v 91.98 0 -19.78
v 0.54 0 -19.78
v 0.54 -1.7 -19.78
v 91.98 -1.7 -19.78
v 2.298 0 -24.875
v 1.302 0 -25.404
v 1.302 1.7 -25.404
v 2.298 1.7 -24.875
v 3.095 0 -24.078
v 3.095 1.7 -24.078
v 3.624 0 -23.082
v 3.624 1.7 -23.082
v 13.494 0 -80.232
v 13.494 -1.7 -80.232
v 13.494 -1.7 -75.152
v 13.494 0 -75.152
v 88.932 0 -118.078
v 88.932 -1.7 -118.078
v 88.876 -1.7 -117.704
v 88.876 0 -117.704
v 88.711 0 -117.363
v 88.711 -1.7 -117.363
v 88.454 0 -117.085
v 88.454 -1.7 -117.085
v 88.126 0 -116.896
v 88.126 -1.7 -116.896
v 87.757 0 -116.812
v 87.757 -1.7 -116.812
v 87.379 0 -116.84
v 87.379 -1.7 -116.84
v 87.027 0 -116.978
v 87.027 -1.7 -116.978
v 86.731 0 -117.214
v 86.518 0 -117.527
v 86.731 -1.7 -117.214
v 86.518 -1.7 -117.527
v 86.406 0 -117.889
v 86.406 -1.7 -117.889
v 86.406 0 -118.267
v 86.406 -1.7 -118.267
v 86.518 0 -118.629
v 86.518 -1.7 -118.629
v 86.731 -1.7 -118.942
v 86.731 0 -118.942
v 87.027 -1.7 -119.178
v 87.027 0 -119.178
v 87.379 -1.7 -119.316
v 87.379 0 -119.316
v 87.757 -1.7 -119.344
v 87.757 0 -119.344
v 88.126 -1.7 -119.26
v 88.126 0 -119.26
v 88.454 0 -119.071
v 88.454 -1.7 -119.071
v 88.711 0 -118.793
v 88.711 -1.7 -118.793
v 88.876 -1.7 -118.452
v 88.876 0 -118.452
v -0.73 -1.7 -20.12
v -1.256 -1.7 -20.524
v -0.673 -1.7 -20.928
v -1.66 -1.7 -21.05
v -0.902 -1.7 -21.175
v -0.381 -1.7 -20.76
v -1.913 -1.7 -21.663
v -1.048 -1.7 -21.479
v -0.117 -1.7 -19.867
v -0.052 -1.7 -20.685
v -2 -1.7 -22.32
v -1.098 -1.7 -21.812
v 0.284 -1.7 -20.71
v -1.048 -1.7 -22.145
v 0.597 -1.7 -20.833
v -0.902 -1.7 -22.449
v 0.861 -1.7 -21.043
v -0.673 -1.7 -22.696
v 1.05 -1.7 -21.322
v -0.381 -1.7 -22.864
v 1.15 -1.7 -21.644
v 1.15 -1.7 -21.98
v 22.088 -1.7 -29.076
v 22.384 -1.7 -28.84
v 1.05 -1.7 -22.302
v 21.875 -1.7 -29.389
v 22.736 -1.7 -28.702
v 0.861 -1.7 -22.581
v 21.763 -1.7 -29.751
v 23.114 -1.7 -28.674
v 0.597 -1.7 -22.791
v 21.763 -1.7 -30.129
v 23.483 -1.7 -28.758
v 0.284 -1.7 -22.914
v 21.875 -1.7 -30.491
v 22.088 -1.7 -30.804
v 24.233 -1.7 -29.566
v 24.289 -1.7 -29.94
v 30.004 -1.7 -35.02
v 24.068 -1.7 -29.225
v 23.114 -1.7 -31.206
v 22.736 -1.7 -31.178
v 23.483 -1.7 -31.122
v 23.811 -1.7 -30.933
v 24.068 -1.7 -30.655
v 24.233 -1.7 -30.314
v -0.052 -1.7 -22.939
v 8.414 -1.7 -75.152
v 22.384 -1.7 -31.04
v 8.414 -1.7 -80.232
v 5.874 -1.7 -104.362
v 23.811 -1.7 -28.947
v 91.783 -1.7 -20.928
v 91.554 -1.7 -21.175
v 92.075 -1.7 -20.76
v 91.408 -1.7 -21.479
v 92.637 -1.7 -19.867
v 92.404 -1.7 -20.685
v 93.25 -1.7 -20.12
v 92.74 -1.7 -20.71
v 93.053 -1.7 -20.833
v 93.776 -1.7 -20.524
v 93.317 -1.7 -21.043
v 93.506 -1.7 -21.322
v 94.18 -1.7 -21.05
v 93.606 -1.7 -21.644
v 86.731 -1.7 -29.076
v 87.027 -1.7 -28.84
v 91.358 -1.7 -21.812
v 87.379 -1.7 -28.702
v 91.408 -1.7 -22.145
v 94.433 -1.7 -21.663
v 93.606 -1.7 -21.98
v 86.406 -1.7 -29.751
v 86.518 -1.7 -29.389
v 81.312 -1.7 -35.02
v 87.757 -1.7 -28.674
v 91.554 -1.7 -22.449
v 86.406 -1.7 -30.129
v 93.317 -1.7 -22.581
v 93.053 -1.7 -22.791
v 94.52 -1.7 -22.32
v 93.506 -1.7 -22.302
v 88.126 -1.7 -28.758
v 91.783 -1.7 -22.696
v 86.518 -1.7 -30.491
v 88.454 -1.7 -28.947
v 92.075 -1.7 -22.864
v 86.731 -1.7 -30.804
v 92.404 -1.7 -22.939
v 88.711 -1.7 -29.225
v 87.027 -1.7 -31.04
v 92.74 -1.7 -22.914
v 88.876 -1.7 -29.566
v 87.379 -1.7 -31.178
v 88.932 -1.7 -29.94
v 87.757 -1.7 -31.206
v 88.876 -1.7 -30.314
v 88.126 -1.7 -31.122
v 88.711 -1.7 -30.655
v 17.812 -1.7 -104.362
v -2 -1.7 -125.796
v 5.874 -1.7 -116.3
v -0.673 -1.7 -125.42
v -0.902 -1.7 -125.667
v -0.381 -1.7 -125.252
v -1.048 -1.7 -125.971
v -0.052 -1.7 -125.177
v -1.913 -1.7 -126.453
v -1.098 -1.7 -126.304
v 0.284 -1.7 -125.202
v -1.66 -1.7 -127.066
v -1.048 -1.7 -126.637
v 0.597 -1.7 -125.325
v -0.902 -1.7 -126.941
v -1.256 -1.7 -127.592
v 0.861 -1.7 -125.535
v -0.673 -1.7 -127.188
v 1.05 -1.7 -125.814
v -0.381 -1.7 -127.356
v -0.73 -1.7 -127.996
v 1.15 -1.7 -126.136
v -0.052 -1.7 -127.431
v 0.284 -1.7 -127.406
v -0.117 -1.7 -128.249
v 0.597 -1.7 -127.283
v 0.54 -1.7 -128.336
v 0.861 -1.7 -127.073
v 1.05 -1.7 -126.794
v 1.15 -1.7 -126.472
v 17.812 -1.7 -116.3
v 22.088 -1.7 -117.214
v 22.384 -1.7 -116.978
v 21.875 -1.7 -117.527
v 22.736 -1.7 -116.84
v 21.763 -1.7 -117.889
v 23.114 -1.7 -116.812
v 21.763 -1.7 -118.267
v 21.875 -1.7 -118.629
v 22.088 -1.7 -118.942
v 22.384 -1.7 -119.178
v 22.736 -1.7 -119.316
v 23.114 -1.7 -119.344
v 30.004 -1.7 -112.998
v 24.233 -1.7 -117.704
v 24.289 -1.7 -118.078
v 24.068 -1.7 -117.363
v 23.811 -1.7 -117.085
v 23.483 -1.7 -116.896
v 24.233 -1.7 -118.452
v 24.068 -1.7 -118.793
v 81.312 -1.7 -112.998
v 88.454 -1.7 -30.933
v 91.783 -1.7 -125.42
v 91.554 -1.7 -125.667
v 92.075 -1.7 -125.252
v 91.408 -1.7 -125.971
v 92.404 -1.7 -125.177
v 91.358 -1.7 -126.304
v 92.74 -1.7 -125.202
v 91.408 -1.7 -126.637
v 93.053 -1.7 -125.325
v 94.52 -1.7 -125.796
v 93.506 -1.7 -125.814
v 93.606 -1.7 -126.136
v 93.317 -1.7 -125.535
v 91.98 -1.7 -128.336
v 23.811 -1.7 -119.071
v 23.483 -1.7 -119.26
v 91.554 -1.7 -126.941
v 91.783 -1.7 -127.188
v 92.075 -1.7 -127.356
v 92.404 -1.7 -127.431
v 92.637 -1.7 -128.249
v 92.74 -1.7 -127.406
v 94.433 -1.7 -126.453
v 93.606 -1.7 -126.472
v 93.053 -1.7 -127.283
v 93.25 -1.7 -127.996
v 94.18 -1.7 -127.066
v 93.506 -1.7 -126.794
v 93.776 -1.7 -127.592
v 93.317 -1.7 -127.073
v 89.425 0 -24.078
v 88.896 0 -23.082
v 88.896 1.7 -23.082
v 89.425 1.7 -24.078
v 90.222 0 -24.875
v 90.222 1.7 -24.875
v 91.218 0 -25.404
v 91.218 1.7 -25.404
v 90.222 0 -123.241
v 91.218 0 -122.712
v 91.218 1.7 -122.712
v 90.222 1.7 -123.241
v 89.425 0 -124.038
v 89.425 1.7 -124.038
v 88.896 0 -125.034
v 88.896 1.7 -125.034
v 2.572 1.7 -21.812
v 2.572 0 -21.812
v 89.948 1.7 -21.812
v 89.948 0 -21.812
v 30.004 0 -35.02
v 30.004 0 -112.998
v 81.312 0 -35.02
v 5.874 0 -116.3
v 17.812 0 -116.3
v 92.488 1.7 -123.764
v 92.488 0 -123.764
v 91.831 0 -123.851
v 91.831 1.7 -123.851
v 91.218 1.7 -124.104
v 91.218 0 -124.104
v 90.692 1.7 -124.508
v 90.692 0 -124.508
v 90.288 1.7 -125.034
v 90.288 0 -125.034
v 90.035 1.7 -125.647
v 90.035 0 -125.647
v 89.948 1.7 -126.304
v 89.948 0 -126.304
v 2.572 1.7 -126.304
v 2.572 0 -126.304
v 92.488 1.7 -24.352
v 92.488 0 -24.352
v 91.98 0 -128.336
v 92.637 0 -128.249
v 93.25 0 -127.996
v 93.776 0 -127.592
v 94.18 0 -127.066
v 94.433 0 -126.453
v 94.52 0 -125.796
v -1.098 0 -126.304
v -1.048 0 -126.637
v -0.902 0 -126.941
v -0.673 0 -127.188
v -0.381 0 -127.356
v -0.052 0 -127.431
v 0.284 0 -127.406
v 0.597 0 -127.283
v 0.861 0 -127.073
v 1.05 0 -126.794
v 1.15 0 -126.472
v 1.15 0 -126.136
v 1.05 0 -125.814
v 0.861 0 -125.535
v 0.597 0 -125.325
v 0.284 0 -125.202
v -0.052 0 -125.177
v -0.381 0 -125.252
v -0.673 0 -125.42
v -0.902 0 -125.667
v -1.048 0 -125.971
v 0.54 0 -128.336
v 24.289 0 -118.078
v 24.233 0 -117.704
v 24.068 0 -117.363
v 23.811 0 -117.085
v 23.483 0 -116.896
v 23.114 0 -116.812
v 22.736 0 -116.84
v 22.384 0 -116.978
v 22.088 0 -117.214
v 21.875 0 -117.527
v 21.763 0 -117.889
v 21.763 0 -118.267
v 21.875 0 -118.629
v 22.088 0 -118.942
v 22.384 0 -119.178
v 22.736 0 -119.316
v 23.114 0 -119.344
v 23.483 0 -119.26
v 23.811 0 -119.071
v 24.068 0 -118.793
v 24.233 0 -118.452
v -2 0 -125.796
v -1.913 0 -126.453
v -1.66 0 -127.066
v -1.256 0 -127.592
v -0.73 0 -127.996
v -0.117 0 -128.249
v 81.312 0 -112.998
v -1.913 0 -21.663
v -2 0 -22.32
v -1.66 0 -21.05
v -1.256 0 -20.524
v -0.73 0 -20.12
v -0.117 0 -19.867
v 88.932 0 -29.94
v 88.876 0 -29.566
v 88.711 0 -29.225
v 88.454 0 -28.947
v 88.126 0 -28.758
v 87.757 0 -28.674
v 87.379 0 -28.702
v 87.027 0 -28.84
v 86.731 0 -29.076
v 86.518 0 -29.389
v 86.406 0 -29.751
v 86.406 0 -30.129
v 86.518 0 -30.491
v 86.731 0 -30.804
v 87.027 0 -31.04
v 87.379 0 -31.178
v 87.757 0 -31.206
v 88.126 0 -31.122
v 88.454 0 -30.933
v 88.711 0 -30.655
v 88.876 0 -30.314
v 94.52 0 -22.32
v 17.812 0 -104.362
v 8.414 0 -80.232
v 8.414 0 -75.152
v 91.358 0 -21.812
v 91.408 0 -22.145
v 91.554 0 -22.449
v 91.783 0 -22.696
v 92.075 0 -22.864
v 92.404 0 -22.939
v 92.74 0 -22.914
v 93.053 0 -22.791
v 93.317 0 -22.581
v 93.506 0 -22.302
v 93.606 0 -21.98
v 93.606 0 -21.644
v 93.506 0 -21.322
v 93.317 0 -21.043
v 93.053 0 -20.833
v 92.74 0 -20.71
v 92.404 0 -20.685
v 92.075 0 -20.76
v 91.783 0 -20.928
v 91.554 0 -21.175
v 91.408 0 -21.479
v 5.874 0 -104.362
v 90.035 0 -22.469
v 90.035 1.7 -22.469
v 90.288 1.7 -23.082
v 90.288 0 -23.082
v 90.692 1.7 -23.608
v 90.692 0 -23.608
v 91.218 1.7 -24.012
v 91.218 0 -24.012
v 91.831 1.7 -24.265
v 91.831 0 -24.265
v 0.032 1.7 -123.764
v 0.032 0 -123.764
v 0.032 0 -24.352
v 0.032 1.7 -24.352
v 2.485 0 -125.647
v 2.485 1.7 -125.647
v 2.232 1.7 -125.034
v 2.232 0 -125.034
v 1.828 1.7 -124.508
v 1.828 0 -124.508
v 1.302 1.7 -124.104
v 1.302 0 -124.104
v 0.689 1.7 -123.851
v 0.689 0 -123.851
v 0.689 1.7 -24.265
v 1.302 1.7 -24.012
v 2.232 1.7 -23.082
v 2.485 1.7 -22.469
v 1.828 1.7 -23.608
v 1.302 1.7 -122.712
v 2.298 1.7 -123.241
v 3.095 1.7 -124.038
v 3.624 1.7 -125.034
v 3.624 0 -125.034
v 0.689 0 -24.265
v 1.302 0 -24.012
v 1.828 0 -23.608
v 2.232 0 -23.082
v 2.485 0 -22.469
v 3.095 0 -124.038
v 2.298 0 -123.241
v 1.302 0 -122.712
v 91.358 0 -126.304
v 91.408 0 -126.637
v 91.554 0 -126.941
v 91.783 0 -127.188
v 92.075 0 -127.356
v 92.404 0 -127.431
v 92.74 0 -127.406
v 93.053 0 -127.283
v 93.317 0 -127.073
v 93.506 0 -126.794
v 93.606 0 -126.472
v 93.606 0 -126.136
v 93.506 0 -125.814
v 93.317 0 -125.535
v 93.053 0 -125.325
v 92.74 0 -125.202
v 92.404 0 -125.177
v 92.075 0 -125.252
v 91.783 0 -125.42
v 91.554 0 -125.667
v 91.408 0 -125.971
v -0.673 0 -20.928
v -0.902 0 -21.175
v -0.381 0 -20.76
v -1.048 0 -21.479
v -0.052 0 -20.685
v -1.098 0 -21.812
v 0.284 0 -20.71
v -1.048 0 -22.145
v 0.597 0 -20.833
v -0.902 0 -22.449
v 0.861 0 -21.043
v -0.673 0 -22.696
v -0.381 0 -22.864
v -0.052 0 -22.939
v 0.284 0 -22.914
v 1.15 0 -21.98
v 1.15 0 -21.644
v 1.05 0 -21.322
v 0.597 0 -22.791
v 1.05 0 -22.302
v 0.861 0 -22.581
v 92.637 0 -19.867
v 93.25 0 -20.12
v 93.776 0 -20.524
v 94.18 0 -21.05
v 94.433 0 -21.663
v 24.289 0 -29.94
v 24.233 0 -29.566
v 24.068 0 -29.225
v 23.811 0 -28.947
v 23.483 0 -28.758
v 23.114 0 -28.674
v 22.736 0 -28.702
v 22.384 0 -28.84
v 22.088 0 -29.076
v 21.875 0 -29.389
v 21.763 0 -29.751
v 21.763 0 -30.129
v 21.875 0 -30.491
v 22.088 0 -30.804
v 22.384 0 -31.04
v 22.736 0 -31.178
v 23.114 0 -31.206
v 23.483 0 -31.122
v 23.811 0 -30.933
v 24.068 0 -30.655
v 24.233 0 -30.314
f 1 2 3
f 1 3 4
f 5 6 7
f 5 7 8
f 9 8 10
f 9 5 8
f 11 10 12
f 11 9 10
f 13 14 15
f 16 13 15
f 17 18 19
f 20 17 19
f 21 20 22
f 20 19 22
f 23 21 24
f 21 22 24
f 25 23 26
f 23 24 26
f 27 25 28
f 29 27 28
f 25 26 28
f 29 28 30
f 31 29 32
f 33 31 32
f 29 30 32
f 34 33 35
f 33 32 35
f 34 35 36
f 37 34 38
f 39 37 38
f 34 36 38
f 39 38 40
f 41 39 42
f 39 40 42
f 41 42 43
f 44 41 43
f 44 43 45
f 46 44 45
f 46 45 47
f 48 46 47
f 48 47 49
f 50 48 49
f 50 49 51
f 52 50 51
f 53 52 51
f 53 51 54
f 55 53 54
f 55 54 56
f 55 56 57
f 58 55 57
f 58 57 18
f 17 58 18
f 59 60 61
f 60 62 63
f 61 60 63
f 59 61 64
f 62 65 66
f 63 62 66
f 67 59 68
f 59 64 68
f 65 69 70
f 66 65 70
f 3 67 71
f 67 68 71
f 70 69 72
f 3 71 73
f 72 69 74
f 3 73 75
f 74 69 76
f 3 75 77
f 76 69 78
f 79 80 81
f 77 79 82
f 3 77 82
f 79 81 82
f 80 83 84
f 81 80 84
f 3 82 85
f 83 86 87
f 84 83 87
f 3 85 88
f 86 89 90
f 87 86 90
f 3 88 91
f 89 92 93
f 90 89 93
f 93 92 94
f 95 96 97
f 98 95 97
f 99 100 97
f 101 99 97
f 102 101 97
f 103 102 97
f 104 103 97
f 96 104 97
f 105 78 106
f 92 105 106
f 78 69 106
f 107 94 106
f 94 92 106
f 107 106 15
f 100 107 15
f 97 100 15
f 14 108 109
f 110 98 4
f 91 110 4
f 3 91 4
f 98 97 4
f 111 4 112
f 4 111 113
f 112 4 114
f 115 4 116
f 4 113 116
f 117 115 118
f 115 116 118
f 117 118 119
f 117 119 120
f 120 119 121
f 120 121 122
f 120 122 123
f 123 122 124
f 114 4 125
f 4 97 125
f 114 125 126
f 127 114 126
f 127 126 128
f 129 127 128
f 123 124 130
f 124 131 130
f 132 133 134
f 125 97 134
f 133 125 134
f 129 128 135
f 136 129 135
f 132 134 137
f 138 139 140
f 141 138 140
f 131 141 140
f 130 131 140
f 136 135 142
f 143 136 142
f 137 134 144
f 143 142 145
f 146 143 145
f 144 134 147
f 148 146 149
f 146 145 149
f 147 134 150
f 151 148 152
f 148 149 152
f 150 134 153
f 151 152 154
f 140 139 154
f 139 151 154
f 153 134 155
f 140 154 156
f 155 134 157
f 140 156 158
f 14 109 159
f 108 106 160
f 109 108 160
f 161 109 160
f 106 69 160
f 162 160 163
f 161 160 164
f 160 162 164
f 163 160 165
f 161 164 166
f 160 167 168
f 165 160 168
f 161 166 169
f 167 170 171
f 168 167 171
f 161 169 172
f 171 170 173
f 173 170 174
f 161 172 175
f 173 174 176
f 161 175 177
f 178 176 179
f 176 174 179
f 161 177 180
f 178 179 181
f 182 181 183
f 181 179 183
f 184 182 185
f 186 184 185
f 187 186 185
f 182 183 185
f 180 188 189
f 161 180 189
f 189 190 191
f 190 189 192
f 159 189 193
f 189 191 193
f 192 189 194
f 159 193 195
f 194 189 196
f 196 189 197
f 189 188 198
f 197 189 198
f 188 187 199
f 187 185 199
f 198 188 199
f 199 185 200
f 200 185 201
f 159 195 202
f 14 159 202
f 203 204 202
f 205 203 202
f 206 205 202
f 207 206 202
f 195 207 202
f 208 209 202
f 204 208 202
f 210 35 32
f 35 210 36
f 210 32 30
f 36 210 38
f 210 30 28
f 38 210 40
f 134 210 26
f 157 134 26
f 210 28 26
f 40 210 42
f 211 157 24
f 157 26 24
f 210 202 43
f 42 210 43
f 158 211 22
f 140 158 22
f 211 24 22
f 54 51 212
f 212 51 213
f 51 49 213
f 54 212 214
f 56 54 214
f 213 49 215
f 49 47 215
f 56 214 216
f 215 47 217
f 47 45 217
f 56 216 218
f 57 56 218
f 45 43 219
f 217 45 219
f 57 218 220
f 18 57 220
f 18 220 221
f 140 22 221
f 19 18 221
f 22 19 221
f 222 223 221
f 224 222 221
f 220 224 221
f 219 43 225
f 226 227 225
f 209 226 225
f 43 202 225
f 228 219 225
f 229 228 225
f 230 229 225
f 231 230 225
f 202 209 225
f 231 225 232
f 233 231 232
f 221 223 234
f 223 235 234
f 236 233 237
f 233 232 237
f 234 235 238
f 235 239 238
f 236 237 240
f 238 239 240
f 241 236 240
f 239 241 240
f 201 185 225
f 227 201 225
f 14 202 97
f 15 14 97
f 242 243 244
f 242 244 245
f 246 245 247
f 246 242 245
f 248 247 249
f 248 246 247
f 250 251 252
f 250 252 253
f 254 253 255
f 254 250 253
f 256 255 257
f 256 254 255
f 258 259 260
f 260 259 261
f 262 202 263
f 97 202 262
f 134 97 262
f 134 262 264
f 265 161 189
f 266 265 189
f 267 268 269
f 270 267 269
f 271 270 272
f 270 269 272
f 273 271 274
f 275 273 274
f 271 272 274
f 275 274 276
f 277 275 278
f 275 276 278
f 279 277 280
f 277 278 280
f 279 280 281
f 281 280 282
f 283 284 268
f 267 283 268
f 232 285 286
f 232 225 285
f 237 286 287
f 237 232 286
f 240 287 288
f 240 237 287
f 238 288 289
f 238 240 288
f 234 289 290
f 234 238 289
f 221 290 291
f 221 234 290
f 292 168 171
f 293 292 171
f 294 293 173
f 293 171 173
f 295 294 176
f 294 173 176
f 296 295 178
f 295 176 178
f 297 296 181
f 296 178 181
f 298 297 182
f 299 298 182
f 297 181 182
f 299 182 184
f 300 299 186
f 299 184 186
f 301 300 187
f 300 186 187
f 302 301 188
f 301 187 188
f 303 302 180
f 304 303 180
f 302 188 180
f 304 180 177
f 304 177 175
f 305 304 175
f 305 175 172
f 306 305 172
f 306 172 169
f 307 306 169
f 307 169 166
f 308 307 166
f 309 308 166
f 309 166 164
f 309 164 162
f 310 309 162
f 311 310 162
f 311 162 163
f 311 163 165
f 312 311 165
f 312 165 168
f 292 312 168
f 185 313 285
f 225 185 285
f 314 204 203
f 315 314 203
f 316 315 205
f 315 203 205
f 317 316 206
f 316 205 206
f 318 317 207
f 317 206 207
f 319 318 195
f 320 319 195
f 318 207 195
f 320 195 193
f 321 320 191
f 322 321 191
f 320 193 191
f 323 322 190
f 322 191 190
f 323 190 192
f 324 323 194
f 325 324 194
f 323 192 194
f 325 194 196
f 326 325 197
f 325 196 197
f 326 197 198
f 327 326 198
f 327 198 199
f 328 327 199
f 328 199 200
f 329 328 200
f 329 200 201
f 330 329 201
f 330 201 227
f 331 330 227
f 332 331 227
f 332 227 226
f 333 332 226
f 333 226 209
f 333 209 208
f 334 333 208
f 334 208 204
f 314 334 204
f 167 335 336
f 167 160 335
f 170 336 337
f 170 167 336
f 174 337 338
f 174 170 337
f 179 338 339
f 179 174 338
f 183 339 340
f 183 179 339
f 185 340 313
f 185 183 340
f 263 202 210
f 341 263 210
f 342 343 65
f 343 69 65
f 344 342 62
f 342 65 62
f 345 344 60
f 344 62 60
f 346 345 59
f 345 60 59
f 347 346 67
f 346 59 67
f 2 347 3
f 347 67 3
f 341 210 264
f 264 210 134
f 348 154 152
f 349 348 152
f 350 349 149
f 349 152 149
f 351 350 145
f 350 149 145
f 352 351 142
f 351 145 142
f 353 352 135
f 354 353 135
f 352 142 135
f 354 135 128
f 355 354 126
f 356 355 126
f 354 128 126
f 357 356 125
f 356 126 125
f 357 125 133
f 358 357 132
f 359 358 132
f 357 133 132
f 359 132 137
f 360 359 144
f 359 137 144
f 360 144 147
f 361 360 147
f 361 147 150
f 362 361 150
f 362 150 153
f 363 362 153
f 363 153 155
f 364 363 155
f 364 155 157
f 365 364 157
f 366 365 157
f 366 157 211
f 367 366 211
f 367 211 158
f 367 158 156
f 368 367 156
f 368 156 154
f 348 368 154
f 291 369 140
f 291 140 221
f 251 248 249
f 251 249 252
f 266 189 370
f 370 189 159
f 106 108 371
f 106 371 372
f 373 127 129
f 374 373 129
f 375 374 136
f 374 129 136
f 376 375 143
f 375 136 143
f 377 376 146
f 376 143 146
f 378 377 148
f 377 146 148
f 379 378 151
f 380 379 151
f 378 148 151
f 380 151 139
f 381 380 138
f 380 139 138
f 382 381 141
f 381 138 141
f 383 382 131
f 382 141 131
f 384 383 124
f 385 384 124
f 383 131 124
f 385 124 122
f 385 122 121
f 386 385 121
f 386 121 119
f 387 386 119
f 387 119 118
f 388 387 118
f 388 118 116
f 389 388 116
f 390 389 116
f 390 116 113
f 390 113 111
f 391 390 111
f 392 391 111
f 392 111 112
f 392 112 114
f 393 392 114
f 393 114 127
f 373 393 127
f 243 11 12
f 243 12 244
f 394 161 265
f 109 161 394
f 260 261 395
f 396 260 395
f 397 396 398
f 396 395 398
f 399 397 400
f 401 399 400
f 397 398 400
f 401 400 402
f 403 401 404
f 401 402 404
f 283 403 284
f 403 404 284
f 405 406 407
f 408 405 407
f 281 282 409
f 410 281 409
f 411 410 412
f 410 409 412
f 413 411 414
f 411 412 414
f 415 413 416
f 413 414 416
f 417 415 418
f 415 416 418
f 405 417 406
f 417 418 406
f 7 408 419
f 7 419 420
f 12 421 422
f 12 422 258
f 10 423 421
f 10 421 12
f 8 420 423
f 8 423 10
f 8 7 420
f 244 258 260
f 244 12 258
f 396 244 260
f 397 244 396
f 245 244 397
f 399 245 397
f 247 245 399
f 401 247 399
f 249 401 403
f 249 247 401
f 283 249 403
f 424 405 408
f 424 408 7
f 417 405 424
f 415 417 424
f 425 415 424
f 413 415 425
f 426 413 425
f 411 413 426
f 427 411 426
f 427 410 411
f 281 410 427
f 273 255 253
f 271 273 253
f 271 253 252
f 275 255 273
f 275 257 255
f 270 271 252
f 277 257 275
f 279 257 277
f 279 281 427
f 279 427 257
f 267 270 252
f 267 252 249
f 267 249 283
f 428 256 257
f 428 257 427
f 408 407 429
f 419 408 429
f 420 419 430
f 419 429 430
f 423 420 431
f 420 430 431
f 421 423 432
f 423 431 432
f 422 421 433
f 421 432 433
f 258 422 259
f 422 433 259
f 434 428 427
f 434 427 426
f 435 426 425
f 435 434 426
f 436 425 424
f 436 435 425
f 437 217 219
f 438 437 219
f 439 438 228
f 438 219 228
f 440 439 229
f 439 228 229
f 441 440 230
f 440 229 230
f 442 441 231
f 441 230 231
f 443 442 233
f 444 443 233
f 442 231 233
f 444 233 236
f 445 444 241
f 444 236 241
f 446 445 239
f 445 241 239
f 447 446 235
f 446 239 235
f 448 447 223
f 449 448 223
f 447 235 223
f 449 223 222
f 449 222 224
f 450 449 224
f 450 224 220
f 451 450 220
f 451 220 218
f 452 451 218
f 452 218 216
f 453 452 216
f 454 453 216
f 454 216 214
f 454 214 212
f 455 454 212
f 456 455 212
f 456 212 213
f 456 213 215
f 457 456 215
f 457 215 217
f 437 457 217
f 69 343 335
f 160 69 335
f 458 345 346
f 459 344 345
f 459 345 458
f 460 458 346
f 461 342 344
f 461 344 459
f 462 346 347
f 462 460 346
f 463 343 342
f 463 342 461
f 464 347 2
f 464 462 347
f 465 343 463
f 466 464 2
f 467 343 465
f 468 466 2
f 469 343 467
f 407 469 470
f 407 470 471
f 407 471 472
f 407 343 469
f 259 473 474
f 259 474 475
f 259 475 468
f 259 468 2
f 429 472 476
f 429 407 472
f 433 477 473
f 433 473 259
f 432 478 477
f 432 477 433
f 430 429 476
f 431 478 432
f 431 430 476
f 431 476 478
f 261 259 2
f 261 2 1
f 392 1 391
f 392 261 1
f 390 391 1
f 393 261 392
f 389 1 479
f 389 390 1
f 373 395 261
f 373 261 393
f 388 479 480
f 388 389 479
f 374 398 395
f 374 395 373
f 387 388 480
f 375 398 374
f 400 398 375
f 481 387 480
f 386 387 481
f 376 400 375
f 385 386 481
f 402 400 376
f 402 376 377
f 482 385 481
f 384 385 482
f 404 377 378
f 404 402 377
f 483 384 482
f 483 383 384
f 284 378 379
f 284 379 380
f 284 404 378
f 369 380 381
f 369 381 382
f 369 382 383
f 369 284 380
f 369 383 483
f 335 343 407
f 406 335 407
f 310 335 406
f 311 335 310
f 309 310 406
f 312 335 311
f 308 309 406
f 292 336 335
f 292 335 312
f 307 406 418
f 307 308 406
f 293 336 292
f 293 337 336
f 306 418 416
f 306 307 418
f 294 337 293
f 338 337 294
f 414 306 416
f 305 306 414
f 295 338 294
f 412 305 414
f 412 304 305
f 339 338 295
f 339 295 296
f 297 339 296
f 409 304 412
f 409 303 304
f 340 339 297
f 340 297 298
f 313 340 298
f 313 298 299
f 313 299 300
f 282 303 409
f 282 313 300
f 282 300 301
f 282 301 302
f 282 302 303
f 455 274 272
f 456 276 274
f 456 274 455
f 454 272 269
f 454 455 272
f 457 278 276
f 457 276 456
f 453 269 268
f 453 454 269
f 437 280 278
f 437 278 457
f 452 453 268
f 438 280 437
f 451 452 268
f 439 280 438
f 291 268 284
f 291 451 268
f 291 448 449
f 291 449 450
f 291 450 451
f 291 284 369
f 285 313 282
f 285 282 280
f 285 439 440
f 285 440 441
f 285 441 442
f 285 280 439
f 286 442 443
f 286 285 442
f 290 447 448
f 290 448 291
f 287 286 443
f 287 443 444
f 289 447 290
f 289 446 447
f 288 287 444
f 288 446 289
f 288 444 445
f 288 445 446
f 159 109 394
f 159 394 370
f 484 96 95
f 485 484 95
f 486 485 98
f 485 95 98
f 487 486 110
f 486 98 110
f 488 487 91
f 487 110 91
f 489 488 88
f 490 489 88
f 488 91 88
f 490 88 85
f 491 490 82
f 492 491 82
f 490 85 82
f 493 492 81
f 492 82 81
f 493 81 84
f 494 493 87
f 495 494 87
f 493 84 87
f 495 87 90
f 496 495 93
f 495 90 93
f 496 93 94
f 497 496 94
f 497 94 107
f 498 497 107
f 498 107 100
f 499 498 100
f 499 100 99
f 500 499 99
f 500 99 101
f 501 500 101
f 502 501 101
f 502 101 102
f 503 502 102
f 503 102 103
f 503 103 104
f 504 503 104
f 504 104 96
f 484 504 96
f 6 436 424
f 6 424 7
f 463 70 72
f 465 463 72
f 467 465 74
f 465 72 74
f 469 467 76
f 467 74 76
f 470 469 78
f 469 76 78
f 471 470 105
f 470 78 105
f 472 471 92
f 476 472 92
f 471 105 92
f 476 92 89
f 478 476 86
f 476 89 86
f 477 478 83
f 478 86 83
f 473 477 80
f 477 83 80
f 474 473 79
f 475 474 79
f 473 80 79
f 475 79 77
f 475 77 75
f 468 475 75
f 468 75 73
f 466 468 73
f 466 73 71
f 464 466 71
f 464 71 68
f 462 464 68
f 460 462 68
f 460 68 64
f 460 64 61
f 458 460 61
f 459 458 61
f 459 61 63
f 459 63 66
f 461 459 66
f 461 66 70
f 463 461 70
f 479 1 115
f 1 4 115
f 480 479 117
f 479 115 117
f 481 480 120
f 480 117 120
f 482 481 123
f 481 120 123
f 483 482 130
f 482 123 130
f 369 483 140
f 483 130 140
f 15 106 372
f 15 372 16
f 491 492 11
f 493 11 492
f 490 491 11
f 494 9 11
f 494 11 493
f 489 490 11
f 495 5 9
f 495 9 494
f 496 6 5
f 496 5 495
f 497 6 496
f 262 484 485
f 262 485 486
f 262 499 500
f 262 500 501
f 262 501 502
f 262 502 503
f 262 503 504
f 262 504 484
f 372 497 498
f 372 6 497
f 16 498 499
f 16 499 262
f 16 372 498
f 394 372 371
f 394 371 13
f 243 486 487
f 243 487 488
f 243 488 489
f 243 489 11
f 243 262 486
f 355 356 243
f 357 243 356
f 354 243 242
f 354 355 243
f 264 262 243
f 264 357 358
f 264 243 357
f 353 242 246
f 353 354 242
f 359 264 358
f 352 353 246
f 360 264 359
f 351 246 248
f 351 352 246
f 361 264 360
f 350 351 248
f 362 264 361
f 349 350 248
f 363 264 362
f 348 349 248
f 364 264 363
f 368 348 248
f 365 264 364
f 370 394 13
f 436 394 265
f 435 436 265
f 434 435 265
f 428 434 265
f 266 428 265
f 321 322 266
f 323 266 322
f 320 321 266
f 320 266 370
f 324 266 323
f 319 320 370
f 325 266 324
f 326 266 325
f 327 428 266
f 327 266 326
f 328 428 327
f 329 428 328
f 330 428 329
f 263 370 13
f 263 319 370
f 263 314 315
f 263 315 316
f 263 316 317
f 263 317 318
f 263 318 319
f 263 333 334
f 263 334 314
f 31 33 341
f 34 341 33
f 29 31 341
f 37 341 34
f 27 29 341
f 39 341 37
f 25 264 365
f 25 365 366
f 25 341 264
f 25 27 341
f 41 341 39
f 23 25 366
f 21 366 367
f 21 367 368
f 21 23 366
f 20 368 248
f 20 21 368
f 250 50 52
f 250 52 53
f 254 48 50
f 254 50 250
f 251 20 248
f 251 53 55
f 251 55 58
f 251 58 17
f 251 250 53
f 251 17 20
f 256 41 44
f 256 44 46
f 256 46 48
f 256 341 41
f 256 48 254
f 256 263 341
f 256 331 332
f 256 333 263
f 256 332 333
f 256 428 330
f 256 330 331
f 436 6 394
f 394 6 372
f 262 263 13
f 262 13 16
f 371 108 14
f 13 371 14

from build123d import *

# Parameters (mm, degrees)
SKETCH20_W            = 96.52
SKETCH20_H            = 108.5559932
BOSS_EXTRUDE5_DEPTH   = 1.699999902
BOSS_EXTRUDE6_DEPTH   = 1.7
FILLET3_R             = 2.54
F_4_40_TAPPED_HOLE3_D = 2.2606
SKETCH28_W            = 51.308
SKETCH28_H            = 77.978
SKETCH28_W_2          = 11.938
SKETCH28_H_2          = 11.938
SKETCH28_W_3          = 5.08
SKETCH28_H_3          = 5.08
SKETCH28_R            = 1.27
CUT_EXTRUDE1_DEPTH    = 8.89


with BuildPart() as part:
    # Sketch20 → Boss-Extrude5 (new body)
    with BuildSketch(Plane(origin=(0, 0, 0), x_dir=(1, 0, 0), z_dir=(0, 1, 0))):
        with Locations((46.26, 74.0579966)):
            Rectangle(SKETCH20_W, SKETCH20_H)
    extrude(amount=-BOSS_EXTRUDE5_DEPTH)

    # Sketch20<3> → Boss-Extrude6 (add)
    with BuildSketch(Plane(origin=(0, 0, 0), x_dir=(1, 0, 0), z_dir=(0, 1, 0))):
        with BuildLine():
            Line((2.572, 21.812), (89.948, 21.812))
            ThreePointArc((89.948, 21.812), (90.691948776, 23.608051224), (92.488, 24.352))
            Line((92.488, 24.352), (92.488, 123.7639932))
            ThreePointArc((92.488, 123.7639932), (90.691948776, 124.507941976), (89.948, 126.3039932))
            Line((89.948, 126.3039932), (2.572, 126.3039932))
            ThreePointArc((2.572, 126.3039932), (1.828051224, 124.507941976), (0.032, 123.7639932))
            Line((0.032, 123.7639932), (0.032, 24.352))
            ThreePointArc((0.032, 24.352), (1.828051224, 23.608051224), (2.572, 21.812))
        make_face()
        with BuildLine():
            Line((3.624102448, 23.082), (88.895897552, 23.082))
            ThreePointArc((88.895897552, 23.082), (89.793923164, 24.506076836), (91.218, 25.404102448))
            Line((91.218, 25.404102448), (91.218, 122.711890752))
            ThreePointArc((91.218, 122.711890752), (89.793923164, 123.609916364), (88.895897552, 125.0339932))
            Line((88.895897552, 125.0339932), (3.624102448, 125.0339932))
            ThreePointArc((3.624102448, 125.0339932), (2.726076836, 123.609916364), (1.302, 122.711890752))
            Line((1.302, 122.711890752), (1.302, 25.404102448))
            ThreePointArc((1.302, 25.404102448), (2.726076836, 24.506076836), (3.624102448, 23.082))
        make_face(mode=Mode.SUBTRACT)
    extrude(amount=BOSS_EXTRUDE6_DEPTH)

    # Fillet3
    fillet3_edges = [part.edges().sort_by_distance(p)[0] for p in [
        (-2, -0.849999951, -19.78),
        (-2, -0.849999951, -128.3359932),
        (94.52, -0.849999951, -128.3359932),
        (94.52, -0.849999951, -19.78),
    ]]
    fillet(fillet3_edges, radius=FILLET3_R)

    # #4-40 Tapped Hole3 (through all)
    with Locations(Plane(origin=(0, 0, 0), x_dir=(1, 0, 0), z_dir=(0, 1, 0))):
        with Locations((0.032, 21.812), (92.488, 21.812), (92.488, 126.3039932), (0.032, 126.3039932)):
            Hole(F_4_40_TAPPED_HOLE3_D / 2)

    # Sketch28 → Cut-Extrude1 (cut)
    with BuildSketch(Plane.XZ.offset(1.699999902)):
        with Locations((55.658, -74.009)):
            Rectangle(SKETCH28_W, SKETCH28_H)
        with Locations((11.843, -110.331)):
            Rectangle(SKETCH28_W_2, SKETCH28_H_2)
        with Locations((10.954, -77.692)):
            Rectangle(SKETCH28_W_3, SKETCH28_H_3)
        with Locations((87.662, -29.94)):
            Circle(SKETCH28_R)
        with Locations((87.662, -118.078)):
            Circle(SKETCH28_R)
        with Locations((23.019, -29.94)):
            Circle(SKETCH28_R)
        with Locations((23.019, -118.078)):
            Circle(SKETCH28_R)
    extrude(amount=-CUT_EXTRUDE1_DEPTH, mode=Mode.SUBTRACT)


solid = part.part
